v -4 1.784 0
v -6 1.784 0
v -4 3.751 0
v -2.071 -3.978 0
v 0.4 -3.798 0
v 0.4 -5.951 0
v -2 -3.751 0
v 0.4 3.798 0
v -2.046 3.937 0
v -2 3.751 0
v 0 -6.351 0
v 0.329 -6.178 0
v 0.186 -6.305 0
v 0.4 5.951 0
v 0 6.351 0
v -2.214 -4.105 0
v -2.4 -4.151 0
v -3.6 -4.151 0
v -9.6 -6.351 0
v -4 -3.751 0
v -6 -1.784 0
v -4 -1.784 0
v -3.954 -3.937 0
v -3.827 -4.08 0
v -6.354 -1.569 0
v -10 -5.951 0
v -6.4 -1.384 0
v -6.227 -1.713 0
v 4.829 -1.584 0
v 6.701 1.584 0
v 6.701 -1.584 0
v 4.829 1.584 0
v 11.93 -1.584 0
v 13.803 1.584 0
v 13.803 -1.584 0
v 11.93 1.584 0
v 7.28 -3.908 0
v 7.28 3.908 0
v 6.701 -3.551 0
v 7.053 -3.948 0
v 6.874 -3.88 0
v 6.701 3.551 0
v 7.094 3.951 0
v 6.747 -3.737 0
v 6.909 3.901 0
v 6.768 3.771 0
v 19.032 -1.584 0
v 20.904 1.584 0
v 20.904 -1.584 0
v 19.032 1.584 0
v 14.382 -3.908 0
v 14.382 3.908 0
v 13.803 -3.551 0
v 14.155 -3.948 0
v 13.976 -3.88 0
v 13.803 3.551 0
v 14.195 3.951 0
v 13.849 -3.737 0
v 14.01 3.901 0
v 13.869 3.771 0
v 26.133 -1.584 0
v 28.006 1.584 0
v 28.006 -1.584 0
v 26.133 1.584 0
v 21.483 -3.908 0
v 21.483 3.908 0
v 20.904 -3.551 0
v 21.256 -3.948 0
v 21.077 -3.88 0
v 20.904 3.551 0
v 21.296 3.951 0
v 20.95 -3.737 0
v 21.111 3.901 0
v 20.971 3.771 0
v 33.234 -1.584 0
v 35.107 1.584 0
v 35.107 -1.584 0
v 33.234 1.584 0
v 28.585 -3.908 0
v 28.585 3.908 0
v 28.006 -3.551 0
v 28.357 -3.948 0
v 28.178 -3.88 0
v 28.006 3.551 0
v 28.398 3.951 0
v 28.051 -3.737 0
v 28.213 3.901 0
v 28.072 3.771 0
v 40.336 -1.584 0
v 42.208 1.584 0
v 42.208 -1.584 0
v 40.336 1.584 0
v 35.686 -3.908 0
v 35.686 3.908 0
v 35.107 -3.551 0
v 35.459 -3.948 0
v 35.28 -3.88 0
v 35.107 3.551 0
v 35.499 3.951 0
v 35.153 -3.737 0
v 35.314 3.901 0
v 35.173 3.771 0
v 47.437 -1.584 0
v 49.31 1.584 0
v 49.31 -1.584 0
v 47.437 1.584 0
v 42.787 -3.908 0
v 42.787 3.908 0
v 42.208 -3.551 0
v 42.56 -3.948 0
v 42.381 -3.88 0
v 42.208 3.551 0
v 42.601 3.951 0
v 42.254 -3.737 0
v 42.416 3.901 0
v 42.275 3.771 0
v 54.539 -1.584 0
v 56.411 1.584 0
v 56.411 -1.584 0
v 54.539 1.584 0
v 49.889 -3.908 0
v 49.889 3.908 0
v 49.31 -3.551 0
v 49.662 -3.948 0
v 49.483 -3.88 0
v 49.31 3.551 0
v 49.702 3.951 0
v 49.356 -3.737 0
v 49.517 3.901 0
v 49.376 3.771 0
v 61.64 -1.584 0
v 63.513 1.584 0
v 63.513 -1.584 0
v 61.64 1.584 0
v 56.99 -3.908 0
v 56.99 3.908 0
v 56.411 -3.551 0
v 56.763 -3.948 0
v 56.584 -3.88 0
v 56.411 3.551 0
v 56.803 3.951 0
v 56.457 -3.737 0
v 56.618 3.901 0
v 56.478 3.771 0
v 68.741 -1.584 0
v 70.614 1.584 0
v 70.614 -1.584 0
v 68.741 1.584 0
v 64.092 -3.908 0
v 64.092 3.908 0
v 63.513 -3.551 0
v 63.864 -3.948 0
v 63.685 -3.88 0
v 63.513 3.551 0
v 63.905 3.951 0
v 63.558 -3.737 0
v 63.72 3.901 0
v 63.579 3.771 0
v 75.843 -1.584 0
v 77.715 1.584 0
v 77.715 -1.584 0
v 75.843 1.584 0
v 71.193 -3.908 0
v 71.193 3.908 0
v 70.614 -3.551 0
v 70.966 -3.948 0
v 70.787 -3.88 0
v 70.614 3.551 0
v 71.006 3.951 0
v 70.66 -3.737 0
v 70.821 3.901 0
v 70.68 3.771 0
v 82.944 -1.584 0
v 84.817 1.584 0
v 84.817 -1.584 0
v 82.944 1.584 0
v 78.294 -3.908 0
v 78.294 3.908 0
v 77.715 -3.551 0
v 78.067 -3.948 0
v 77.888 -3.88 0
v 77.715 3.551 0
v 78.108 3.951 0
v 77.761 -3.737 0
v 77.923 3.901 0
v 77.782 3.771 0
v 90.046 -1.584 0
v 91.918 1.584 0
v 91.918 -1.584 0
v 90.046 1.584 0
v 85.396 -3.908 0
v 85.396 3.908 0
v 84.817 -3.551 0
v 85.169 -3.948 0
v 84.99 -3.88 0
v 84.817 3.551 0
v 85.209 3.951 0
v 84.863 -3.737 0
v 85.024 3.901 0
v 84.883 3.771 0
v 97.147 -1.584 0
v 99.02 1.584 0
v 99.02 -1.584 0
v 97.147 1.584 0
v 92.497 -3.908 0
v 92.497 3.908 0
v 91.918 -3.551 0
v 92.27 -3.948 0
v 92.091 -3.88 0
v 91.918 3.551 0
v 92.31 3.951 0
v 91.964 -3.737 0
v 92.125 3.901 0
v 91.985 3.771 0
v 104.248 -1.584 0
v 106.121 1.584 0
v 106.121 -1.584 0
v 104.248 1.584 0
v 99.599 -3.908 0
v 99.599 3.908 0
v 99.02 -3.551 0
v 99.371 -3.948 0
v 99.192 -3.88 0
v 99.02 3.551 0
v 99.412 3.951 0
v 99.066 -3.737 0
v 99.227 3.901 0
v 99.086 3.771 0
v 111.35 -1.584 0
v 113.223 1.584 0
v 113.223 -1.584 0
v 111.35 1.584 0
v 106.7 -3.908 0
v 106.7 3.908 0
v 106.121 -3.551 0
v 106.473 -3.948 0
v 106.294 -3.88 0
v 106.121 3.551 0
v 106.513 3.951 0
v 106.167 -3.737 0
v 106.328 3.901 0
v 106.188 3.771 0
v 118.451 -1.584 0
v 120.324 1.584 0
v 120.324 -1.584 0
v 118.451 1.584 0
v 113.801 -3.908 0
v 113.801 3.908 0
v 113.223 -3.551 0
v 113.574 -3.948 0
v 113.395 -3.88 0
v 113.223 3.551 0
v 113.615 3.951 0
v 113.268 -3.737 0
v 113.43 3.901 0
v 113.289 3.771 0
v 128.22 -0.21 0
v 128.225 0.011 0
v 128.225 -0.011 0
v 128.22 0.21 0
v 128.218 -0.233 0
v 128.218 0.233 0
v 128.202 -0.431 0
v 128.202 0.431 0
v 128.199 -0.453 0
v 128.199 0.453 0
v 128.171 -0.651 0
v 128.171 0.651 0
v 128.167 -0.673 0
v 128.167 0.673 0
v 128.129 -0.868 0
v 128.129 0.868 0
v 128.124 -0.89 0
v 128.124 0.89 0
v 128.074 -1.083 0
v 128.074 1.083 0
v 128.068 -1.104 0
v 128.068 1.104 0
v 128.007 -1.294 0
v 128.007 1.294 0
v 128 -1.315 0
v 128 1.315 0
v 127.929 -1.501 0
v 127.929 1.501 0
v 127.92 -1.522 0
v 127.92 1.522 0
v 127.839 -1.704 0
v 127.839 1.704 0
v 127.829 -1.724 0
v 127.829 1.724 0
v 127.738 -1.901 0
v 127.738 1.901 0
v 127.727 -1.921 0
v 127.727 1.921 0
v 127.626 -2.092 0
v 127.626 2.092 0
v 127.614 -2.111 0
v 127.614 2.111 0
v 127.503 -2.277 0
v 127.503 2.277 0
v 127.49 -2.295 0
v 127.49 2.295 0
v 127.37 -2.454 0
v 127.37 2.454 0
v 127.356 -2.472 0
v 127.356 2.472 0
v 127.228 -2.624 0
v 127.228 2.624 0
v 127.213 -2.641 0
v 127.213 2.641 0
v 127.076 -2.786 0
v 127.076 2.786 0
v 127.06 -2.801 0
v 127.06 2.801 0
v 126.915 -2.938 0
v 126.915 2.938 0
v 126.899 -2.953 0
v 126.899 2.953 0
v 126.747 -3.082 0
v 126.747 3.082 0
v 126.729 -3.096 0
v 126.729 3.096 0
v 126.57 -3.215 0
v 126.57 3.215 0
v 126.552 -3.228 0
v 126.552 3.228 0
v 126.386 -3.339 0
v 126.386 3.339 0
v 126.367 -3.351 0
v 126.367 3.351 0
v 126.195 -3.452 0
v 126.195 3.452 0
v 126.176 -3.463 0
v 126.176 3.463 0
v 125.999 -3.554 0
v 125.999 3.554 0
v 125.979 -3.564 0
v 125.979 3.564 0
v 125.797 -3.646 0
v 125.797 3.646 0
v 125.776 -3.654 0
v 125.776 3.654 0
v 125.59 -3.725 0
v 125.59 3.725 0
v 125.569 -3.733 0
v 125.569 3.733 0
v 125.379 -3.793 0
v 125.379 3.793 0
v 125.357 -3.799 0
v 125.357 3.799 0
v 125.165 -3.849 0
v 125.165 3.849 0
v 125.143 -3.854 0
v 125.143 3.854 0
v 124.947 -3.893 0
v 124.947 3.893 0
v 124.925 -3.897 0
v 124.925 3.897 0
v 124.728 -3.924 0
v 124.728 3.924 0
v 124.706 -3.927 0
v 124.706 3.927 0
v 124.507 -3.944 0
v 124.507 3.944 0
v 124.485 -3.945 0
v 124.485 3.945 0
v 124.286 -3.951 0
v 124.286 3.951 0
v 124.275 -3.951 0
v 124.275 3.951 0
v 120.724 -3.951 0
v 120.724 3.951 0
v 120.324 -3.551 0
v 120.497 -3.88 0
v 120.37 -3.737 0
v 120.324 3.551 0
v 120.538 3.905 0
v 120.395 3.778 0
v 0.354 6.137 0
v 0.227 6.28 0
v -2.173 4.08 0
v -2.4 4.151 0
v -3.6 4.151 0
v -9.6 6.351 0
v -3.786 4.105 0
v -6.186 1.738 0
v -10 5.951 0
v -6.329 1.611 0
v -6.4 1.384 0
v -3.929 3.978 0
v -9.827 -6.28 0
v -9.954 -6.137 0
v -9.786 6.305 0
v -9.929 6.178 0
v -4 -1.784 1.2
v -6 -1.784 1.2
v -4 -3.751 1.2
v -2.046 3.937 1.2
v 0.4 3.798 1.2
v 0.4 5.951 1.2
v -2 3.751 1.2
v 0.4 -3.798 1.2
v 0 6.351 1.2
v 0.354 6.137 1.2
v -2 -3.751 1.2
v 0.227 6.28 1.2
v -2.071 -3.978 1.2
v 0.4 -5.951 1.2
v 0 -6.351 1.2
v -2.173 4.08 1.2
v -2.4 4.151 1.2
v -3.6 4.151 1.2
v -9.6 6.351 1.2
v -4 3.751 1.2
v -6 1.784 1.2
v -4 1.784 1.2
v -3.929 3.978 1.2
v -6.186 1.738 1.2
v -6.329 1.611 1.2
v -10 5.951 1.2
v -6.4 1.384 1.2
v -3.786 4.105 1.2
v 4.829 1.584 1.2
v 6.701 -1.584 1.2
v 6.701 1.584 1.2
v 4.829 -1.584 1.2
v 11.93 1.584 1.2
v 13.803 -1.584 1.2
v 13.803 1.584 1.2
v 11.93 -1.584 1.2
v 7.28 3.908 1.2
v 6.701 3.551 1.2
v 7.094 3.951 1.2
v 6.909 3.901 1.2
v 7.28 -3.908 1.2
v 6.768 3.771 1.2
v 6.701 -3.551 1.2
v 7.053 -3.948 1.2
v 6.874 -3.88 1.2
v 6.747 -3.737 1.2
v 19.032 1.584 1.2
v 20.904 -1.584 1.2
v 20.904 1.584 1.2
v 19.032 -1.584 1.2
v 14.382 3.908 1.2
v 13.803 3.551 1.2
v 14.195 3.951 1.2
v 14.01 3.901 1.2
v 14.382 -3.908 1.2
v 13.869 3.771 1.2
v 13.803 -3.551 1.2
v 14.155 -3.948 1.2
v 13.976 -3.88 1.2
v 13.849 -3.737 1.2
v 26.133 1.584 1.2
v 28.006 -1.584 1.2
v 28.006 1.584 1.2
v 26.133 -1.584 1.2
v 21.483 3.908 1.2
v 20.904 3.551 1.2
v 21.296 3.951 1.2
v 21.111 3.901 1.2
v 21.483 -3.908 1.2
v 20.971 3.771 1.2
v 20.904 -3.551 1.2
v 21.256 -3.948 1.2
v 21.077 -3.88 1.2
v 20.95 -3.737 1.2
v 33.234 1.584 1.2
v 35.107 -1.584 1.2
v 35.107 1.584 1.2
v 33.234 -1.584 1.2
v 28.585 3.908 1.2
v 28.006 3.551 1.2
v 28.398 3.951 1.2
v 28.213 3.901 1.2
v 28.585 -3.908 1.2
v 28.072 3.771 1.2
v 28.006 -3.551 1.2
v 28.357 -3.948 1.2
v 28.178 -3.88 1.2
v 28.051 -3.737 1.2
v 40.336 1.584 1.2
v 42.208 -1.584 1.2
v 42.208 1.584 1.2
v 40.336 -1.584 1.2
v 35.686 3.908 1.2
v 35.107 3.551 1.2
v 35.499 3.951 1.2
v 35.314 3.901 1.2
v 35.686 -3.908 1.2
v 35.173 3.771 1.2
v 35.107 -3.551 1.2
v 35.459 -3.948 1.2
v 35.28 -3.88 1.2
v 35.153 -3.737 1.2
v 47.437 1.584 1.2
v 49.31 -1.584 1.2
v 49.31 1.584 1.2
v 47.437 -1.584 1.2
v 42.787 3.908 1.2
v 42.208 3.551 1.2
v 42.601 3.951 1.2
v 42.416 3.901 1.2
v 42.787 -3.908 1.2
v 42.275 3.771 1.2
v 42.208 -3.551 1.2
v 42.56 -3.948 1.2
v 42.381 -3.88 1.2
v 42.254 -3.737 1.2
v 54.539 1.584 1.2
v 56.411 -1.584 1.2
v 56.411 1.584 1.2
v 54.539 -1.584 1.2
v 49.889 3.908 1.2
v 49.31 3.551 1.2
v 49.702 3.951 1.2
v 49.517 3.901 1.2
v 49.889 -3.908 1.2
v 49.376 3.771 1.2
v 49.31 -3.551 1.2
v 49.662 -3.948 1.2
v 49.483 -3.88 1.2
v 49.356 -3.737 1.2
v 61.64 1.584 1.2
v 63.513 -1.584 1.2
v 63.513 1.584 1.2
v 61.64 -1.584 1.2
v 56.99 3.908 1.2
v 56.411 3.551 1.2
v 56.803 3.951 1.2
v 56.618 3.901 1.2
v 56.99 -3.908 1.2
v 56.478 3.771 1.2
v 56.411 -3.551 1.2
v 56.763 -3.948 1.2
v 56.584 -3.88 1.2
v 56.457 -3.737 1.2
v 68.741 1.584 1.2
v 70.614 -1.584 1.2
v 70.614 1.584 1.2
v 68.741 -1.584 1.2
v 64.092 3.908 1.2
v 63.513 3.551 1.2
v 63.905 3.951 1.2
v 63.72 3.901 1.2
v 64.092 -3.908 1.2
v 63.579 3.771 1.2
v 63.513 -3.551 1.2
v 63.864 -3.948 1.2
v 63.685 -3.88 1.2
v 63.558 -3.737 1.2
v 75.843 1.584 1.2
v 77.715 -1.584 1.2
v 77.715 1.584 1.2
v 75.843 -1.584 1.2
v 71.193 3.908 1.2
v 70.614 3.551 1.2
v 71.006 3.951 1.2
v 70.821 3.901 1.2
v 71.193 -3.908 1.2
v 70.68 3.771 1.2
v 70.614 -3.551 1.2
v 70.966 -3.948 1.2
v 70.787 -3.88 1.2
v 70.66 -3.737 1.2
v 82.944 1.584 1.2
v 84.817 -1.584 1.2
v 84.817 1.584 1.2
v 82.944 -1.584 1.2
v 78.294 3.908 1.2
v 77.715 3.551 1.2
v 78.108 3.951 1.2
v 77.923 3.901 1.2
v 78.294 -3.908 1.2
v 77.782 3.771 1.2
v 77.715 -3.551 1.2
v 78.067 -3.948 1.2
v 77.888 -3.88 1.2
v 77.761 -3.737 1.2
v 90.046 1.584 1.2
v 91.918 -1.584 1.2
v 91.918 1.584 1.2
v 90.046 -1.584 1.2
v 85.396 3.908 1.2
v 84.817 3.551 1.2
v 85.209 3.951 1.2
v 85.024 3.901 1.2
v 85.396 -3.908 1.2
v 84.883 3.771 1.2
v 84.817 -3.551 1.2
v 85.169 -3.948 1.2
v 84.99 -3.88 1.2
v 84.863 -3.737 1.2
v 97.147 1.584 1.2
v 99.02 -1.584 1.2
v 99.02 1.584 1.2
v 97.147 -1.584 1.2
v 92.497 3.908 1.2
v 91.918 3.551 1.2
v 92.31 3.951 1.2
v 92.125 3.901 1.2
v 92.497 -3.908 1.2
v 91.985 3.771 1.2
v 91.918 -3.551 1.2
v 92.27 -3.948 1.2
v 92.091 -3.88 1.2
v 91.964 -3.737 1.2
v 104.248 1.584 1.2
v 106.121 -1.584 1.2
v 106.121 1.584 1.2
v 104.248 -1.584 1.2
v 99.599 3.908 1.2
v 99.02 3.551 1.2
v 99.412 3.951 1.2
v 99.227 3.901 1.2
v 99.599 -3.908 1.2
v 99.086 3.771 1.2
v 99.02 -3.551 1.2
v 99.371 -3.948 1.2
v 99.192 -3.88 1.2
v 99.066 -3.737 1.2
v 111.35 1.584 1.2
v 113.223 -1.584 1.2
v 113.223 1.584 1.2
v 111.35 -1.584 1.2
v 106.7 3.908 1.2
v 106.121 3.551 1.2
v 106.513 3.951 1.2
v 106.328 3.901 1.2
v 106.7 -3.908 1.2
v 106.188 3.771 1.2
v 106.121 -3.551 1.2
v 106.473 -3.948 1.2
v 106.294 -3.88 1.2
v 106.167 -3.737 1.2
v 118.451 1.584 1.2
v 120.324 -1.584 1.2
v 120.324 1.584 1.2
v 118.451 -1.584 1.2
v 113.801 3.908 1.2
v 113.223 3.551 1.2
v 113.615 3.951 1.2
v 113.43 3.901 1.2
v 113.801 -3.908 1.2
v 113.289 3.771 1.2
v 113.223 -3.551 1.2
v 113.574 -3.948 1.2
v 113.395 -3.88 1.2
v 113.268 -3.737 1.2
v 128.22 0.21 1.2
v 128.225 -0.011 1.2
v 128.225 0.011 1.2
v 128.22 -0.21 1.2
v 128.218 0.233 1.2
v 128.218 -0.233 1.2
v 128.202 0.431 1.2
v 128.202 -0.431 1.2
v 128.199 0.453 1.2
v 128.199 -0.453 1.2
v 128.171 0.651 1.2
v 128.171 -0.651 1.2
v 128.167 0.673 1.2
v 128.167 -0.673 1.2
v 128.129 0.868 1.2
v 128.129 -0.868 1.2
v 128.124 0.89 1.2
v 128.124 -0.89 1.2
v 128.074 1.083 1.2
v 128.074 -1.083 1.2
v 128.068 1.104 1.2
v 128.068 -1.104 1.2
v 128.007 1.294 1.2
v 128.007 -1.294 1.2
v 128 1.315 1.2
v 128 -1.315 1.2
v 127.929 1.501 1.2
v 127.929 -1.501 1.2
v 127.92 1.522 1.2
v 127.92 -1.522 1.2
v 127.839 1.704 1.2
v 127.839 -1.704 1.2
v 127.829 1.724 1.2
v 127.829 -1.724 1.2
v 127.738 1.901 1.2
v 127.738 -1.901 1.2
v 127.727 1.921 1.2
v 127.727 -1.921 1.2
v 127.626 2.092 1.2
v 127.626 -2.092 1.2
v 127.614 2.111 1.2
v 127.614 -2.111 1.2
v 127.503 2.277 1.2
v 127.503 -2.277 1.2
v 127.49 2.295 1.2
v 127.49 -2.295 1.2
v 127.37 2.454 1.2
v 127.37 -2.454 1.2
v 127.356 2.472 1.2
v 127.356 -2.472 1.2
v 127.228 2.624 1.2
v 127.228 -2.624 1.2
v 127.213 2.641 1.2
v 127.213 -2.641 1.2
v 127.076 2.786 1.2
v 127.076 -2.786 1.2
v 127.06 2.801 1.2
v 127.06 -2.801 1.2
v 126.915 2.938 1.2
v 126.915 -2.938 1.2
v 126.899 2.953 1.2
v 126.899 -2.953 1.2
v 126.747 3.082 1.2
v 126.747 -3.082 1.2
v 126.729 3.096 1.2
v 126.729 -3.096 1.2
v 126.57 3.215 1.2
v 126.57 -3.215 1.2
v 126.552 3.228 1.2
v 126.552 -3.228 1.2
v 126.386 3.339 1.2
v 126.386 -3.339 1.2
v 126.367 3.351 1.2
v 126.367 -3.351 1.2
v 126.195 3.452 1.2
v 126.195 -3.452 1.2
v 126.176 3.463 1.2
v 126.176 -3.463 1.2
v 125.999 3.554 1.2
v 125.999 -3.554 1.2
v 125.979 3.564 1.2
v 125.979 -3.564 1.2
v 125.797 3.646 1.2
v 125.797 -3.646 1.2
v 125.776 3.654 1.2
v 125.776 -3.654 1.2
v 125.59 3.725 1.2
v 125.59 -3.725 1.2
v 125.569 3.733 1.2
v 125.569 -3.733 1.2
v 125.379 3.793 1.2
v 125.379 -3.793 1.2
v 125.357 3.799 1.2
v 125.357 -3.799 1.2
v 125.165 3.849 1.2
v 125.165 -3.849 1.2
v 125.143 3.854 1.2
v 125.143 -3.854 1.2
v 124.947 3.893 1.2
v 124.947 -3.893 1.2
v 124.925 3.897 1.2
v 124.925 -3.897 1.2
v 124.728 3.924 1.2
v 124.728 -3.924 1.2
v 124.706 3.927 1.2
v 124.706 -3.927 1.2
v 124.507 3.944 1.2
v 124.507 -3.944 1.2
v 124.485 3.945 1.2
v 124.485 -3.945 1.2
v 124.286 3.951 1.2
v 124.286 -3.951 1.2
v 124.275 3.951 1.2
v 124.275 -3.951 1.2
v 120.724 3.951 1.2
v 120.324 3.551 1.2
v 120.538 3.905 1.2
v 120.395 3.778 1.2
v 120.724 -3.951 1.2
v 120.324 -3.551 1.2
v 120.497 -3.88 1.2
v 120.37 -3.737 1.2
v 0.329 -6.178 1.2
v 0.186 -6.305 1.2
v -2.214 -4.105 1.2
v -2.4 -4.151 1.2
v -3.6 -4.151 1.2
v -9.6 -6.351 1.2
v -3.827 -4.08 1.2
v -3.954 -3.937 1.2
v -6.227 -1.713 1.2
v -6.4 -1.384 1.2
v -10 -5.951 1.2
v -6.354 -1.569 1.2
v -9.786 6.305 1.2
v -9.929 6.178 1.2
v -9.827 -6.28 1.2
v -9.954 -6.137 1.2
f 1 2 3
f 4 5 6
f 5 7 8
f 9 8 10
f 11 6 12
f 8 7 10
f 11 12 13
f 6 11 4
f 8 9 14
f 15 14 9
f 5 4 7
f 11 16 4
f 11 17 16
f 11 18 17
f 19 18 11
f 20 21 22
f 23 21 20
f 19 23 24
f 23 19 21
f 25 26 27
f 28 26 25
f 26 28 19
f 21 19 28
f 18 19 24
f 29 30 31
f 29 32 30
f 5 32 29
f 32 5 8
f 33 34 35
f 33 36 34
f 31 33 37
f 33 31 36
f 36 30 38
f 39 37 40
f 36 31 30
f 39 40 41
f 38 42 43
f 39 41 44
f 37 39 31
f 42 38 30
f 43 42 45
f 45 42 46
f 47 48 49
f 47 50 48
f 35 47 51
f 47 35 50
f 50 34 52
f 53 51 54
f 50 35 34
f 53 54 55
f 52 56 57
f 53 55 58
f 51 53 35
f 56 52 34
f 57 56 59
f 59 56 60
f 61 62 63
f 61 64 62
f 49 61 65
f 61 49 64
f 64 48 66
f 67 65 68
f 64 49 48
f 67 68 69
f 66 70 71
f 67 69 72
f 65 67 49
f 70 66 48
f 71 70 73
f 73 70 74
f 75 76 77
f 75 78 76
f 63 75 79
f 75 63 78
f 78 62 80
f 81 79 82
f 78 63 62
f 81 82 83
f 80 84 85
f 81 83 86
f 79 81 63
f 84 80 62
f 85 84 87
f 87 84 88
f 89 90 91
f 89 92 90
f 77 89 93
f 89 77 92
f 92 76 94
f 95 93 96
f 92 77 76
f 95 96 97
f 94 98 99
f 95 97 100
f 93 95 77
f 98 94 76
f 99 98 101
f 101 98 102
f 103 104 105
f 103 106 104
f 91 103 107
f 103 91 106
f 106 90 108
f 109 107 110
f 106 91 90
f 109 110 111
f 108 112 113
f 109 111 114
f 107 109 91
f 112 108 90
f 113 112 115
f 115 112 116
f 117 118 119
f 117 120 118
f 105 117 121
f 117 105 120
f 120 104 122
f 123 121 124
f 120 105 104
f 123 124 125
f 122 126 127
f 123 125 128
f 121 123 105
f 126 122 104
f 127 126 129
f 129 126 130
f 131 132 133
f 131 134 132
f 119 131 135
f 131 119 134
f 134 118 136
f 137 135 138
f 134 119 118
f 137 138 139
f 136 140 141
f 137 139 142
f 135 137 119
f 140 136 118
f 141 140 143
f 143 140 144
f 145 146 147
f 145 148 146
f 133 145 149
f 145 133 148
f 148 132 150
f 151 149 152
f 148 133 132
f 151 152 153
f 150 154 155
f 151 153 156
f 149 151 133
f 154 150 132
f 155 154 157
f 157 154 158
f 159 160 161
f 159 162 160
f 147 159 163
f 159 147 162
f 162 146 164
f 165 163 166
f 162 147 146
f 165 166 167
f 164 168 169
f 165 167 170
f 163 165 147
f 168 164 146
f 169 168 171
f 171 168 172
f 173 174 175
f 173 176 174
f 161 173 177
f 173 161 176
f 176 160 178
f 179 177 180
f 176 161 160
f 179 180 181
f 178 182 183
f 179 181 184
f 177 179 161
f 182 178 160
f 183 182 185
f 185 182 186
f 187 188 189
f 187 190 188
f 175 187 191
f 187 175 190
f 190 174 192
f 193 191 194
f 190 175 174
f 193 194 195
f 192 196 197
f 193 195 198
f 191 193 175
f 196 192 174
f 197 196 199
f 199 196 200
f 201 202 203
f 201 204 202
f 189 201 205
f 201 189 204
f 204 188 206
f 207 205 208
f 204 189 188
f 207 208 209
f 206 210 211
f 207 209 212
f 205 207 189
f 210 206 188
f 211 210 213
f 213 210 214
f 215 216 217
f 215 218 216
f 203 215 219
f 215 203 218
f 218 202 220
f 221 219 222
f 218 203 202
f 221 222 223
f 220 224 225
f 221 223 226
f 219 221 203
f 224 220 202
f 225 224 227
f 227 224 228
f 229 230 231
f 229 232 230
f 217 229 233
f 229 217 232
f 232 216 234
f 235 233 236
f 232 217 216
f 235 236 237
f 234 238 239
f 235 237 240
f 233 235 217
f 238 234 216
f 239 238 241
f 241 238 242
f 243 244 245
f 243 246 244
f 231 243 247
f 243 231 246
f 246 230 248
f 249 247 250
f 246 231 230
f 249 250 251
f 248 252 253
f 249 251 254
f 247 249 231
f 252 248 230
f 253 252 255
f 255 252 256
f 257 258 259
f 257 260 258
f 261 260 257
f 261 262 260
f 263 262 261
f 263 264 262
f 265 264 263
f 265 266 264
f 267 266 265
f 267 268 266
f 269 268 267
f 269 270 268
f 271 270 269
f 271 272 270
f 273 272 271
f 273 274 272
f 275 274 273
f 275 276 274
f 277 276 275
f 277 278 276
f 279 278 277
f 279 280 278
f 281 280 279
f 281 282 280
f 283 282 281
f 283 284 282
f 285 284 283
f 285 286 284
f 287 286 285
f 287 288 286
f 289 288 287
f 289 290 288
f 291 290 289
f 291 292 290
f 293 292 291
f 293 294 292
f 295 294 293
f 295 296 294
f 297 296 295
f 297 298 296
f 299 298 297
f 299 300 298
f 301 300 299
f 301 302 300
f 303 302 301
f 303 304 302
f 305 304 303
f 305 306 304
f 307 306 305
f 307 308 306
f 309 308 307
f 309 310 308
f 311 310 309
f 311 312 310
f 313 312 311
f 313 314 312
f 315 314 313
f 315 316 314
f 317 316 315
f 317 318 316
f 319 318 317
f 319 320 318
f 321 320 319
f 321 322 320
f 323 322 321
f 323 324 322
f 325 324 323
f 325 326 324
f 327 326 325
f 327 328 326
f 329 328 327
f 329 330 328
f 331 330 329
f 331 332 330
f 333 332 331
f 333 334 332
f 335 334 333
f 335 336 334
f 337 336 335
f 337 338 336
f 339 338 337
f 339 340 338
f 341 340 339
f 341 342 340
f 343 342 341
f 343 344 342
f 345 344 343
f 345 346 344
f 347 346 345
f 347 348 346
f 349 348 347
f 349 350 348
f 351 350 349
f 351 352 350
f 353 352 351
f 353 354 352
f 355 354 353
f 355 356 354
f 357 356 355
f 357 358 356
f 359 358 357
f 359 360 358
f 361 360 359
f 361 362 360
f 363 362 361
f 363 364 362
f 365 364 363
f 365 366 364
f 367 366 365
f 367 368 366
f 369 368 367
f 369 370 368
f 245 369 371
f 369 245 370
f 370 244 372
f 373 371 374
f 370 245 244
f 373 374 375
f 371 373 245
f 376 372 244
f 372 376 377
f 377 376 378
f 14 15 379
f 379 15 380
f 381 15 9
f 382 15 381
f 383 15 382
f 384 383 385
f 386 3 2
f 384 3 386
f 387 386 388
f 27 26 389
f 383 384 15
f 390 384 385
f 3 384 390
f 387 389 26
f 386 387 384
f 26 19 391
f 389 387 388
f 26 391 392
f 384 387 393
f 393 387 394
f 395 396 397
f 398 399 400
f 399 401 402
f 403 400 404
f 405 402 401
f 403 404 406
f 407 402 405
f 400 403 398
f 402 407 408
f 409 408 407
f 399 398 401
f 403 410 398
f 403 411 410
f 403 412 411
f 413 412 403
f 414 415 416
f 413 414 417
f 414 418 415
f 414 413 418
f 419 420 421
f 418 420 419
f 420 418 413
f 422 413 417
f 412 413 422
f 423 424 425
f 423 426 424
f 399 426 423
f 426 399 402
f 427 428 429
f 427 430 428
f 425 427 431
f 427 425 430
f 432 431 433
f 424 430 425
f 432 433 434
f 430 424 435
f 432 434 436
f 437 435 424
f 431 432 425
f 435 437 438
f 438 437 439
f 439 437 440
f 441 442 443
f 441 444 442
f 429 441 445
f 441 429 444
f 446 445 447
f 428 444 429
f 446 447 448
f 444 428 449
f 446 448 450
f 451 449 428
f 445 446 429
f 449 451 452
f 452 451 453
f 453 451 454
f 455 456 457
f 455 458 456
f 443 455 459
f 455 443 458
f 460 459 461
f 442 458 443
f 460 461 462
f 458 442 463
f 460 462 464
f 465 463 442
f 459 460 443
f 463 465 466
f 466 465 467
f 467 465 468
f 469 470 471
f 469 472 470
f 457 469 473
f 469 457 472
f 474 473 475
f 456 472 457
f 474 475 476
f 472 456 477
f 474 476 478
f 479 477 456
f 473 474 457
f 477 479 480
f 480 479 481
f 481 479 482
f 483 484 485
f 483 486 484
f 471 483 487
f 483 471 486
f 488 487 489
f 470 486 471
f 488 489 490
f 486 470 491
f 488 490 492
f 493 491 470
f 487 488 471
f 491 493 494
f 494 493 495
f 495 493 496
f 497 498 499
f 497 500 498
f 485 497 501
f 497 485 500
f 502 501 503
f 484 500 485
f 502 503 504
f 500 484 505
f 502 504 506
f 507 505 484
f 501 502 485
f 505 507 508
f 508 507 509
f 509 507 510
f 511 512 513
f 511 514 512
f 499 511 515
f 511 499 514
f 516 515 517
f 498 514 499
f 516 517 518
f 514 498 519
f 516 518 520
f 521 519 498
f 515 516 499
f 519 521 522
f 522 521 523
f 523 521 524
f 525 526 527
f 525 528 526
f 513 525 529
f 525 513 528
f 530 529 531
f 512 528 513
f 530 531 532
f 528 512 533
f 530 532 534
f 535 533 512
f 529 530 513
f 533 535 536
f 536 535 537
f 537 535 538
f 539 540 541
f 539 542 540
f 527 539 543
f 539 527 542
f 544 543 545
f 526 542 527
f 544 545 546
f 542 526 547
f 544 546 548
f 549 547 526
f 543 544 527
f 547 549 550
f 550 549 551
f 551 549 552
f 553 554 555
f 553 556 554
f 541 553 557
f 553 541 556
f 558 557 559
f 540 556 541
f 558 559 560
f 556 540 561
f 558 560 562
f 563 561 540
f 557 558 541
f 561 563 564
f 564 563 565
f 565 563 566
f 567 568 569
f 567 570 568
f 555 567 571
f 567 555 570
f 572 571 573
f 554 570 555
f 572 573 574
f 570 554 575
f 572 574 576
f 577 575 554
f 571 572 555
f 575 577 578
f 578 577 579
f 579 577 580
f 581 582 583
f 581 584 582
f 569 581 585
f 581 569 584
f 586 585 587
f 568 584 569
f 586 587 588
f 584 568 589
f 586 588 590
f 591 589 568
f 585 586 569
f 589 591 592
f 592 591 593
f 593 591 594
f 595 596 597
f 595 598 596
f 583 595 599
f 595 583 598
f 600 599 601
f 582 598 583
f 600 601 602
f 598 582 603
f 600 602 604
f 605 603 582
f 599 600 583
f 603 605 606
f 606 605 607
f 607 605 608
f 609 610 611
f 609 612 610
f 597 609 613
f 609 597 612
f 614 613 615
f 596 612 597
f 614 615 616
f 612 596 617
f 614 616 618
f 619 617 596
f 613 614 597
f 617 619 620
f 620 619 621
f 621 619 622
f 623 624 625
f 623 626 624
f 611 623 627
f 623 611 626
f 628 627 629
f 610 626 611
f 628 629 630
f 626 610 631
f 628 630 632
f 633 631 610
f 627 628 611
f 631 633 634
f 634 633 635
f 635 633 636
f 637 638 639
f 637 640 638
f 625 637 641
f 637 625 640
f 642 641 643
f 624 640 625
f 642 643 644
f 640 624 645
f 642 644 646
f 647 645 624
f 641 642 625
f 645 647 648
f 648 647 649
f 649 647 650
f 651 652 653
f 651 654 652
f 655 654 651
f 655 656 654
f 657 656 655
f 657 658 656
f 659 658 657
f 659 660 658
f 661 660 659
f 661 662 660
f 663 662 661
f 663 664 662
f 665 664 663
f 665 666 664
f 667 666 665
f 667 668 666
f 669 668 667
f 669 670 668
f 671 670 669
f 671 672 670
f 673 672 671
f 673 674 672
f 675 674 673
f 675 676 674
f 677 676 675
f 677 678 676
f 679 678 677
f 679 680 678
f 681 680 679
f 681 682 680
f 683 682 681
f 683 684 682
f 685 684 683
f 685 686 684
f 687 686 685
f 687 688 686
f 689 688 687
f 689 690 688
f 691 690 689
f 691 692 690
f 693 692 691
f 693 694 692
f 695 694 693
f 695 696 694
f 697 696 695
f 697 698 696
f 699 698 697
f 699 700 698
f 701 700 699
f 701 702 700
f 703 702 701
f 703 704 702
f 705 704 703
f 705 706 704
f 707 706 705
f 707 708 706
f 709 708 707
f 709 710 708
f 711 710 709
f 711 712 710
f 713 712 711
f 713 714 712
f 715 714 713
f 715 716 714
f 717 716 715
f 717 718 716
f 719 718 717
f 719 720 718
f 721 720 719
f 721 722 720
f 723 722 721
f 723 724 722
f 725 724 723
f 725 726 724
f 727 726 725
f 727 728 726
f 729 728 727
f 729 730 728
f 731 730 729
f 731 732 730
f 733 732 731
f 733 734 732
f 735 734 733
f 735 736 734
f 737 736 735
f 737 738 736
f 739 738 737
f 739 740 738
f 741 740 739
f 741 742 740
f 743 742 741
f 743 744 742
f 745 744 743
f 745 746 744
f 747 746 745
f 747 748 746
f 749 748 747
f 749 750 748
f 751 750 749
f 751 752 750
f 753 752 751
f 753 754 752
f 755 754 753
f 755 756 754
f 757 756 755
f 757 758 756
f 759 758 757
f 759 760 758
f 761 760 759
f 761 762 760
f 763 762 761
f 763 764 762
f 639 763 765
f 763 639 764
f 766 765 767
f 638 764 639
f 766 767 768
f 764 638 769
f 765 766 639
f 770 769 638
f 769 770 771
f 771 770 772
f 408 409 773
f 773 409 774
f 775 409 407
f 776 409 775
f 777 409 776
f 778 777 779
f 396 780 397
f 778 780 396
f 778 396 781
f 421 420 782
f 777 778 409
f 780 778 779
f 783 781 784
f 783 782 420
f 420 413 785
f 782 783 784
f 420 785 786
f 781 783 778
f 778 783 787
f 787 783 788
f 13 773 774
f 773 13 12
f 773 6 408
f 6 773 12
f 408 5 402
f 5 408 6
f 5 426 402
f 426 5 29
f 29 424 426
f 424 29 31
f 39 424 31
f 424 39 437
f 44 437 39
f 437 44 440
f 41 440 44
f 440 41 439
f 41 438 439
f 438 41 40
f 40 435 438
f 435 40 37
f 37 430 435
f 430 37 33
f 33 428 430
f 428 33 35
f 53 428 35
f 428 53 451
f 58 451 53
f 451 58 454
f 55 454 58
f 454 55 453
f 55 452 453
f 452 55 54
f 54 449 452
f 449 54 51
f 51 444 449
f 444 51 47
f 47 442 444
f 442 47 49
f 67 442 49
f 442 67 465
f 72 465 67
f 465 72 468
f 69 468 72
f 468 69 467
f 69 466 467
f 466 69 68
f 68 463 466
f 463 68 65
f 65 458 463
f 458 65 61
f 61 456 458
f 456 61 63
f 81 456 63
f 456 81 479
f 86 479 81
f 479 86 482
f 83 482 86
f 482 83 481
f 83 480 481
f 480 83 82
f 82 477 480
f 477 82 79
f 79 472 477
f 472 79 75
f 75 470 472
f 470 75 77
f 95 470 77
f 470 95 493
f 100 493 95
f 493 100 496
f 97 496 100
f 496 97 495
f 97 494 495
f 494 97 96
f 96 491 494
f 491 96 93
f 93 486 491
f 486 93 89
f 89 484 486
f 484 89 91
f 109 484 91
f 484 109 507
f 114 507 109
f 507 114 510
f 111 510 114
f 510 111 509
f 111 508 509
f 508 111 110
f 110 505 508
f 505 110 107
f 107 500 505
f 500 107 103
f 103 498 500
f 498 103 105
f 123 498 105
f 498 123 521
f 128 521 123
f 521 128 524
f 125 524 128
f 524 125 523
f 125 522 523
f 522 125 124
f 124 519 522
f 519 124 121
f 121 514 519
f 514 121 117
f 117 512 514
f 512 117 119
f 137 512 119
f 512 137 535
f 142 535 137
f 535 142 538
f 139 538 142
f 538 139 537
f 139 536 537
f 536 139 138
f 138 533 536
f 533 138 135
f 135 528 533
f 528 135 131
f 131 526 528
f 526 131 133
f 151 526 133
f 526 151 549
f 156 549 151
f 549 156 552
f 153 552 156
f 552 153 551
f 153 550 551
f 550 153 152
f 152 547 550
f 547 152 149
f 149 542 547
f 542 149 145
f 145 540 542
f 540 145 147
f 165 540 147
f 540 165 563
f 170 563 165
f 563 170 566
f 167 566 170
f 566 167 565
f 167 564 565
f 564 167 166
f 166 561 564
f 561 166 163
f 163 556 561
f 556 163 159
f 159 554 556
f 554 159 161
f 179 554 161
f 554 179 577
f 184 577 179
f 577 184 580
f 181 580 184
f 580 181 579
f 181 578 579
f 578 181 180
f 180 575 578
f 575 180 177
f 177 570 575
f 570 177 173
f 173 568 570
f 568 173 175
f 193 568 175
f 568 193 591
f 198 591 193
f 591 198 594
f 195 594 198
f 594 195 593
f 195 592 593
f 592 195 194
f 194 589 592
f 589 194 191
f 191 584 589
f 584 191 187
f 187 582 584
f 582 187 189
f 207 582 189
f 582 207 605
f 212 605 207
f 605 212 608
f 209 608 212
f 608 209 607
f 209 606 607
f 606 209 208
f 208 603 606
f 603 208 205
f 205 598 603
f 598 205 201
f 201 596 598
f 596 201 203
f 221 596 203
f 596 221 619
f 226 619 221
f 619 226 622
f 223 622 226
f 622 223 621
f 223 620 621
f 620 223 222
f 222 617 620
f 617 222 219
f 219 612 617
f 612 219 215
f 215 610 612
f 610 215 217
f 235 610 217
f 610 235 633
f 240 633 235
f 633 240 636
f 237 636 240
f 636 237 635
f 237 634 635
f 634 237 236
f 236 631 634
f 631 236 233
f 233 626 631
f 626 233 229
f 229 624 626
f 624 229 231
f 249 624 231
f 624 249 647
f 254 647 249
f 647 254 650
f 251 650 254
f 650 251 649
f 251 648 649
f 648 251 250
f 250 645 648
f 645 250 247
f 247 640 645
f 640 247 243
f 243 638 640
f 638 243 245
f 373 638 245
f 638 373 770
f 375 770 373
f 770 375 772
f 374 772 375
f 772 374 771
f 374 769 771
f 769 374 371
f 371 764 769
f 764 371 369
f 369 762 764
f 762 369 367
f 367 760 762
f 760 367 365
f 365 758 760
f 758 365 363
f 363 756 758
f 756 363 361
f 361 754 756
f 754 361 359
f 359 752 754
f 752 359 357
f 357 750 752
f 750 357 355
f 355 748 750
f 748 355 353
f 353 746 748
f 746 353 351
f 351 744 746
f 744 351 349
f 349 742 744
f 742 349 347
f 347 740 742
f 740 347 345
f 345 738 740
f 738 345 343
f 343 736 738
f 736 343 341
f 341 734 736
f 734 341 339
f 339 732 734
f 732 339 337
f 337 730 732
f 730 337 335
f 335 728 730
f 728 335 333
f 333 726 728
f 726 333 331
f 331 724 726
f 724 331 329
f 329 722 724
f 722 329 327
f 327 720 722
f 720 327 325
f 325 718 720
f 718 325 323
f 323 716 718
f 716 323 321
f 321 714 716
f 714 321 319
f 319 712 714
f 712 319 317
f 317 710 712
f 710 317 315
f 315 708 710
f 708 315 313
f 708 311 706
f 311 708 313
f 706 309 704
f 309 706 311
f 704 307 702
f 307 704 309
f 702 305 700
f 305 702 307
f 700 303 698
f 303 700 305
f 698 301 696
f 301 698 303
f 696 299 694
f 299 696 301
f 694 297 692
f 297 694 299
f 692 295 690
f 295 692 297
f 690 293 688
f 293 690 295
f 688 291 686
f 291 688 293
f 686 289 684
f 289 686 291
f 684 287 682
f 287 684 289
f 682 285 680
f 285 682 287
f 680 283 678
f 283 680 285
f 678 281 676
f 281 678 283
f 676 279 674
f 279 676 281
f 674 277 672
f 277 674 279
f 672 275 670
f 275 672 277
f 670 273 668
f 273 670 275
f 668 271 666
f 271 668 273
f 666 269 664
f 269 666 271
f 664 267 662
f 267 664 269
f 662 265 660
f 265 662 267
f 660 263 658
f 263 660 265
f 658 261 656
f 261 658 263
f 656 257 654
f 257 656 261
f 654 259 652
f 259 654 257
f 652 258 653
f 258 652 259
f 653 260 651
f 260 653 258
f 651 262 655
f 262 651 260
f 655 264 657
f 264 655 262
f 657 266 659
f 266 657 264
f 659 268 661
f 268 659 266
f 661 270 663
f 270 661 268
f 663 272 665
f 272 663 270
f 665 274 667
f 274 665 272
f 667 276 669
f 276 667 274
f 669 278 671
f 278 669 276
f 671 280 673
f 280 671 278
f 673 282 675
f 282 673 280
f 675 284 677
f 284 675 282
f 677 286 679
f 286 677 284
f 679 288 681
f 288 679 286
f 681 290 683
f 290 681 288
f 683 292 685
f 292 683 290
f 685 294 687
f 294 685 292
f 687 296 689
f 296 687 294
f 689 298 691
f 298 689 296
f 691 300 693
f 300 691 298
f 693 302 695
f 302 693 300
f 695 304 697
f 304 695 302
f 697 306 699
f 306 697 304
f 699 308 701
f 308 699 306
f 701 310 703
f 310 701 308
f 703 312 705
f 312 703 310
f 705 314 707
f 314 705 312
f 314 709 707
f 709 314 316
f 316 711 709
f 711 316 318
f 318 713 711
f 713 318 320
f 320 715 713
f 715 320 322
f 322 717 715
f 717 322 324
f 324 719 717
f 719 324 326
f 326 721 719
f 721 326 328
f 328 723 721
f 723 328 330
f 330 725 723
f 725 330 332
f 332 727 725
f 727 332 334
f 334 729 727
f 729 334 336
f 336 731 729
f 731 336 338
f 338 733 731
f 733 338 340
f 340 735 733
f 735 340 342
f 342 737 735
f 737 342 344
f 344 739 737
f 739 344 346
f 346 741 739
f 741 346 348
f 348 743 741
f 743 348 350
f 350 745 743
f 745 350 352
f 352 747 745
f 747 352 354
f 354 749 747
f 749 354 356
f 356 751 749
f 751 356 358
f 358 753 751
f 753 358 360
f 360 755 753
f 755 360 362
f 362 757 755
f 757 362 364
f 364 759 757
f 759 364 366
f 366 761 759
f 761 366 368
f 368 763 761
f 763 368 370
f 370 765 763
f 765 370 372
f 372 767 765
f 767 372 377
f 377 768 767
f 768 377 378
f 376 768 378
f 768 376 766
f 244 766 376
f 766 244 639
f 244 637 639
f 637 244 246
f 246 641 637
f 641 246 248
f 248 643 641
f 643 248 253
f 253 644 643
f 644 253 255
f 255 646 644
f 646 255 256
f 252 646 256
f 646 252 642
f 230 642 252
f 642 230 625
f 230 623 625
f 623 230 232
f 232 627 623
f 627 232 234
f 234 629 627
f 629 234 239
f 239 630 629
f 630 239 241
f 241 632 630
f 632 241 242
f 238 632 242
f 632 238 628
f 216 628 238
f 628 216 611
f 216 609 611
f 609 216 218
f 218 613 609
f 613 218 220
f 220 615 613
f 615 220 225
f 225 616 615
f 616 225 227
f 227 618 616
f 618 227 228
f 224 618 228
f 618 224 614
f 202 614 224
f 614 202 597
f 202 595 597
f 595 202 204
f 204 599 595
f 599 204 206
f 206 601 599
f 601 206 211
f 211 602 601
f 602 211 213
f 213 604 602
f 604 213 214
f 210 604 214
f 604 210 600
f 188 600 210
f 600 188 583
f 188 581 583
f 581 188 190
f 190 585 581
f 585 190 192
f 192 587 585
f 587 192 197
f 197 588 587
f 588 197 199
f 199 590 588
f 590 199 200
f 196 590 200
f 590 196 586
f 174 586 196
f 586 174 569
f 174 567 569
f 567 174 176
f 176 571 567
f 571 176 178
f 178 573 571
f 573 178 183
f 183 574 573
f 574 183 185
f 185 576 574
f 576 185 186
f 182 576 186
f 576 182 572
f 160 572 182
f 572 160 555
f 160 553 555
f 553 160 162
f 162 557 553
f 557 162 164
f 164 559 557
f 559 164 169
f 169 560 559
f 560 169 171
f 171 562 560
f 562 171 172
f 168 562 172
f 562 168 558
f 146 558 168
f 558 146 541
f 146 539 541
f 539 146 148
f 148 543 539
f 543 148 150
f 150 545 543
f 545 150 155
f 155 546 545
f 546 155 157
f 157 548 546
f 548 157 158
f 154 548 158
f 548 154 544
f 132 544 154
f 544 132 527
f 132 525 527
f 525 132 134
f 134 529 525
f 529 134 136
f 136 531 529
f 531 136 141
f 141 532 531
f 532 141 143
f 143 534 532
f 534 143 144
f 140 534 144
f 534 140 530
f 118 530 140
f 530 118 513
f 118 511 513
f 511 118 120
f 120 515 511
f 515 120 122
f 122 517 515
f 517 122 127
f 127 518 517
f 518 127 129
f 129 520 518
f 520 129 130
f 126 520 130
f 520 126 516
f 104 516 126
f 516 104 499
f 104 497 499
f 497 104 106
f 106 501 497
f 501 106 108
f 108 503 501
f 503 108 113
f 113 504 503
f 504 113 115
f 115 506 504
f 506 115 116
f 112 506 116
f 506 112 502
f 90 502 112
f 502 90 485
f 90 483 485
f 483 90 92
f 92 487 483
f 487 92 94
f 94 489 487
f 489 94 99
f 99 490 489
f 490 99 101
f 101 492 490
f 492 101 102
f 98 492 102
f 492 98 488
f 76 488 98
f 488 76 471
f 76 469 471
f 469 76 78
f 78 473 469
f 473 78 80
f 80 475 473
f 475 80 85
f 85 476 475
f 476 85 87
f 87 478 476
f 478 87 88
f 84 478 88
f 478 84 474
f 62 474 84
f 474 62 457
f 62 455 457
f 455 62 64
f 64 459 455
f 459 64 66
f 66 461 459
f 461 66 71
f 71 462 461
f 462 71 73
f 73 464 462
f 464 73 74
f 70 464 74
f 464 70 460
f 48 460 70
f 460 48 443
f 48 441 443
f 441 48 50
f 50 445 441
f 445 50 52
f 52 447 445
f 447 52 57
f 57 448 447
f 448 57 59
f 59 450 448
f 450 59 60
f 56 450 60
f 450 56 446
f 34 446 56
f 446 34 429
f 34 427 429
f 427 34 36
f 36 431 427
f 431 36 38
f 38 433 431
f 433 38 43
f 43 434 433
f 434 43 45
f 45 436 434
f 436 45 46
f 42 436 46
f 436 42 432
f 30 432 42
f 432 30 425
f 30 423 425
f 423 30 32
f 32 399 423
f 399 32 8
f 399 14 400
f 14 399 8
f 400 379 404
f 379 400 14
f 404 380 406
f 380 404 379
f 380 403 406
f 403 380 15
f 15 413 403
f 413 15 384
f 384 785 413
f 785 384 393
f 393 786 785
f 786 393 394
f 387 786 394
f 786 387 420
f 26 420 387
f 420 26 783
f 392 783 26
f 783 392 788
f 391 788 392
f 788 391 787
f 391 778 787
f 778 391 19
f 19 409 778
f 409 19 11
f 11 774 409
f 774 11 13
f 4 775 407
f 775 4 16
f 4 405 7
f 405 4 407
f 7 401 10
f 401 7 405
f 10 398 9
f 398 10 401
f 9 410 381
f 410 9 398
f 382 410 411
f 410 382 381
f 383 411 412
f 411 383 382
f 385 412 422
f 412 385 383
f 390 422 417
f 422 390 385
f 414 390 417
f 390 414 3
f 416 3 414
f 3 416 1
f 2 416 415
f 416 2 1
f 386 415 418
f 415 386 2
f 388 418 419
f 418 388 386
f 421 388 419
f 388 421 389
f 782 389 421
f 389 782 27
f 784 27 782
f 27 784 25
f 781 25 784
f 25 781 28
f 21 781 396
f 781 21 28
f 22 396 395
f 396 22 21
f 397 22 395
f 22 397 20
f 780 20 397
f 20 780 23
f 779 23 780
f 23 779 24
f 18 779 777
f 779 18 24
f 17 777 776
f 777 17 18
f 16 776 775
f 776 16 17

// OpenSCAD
/*
 * cabletie.scad generates cable ties primarly meant to be 3D printed in TPU
 */

// Variables default values
cabletie_width = 9;
cabletie_wrapping_diameter = 40;
cabletie_minimum_thickness = 1.2; // would be overrided if to large
label="";
label_font="Liberation Sans:style=Bold";

// FDM 3D printer parameters
nozzle_width = 0.4;
printer_tolerance = 0.2;

// Resolution
$fa=2; // default minimum facet angle
$fs=0.2; // default minimum facet size

module cabletie(w=cabletie_width,
                d=cabletie_wrapping_diameter,
                t=cabletie_minimum_thickness,
                l=label,
                nw=nozzle_width,
                pt=printer_tolerance) {

     // Funcions
     function cabletie_wrapping_circumference(d)
          = 3.14*d;
     function cabletie_steps_lenth(w, nw)
          = (w-2*nw)*cos(30);
     function cabletie_links_count(d, w, nw)
          = floor(cabletie_wrapping_circumference(d)/cabletie_steps_lenth(w, nw));
     function retainer_hole_length(w, nw)
          = cabletie_steps_lenth(w, nw)/3;
     function release_hole_length(w, nw)
          = cabletie_steps_lenth(w, nw);
     function cabletie_maximum_thickness(w, nw)
          = (cabletie_steps_lenth(w, nw)/3+nw)/tan(30)-(nw/sin(30)-nw);
     function cabletie_thickness(mini_thickness, maxi_thickness)
          = mini_thickness > maxi_thickness ? maxi_thickness : mini_thickness;
     function cabletie_lock_length()
          = cabletie_thickness(t, cabletie_maximum_thickness(w, nw))*8;
     function cabletie_lock_width()
          = cabletie_thickness(t, cabletie_maximum_thickness(w, nw))*4+release_hole_length(w, nw);

     // Generates the links
     module cabletie_links() {
          for (i = [0 : cabletie_steps_lenth(w, nw) : cabletie_steps_lenth(w, nw)*(cabletie_links_count(d, w, nw)-1)]) {
               translate([i, 0, 0]) {
                    // Shape of a regular links
                    polygon(points=[[0,0],
                                    [0,cabletie_steps_lenth(w, nw)/2],
                                    [cabletie_steps_lenth(w, nw),0],
                                    [0,-cabletie_steps_lenth(w, nw)/2]]);
               }
          }
          // Last link custom shape
          translate([cabletie_steps_lenth(w, nw)*(cabletie_links_count(d, w, nw)+1/2), 0, 0]) {
               circle(d = cabletie_steps_lenth(w, nw));
          }
          translate([cabletie_steps_lenth(w, nw)*(cabletie_links_count(d, w, nw)), -cabletie_steps_lenth(w, nw)/2, 0]) {
               square([cabletie_steps_lenth(w, nw)/2, cabletie_steps_lenth(w, nw)]);
          }
          // Connect all links
          translate([0, -(cabletie_steps_lenth(w, nw)/3)/2, 0]) {
               square([cabletie_steps_lenth(w, nw)*(cabletie_links_count(d, w, nw)), cabletie_steps_lenth(w, nw)/3]);
          }
     }

     // Generates the cabletie lock frame
     module cabletie_lock_boundary() {
          translate([-cabletie_lock_length(),
                     -cabletie_lock_width()/2,
                     0]) {
               square([cabletie_lock_length(),
                       cabletie_lock_width()]);
          }
     }

     // Generates the cabletie lock hole
     module cabletie_lock_hole() {
          union() {
               translate([-3/8*cabletie_lock_length(),
                          -release_hole_length(w, nw)/2-printer_tolerance,
                          0])
                    square([cabletie_thickness(t, cabletie_maximum_thickness(w, nw)),
                            release_hole_length(w, nw)+2*printer_tolerance]);
               // retainer hole
               translate([-5/8*cabletie_lock_length(),
                          -retainer_hole_length(w, nw)/2-printer_tolerance,
                          0])
                    square([2/8*cabletie_lock_length(),
                            retainer_hole_length(w, nw)+2*printer_tolerance]);
          }
     }

     // Generates text
     module cabletie_text(l) {
          translate([-cabletie_lock_length(), 0, 0]) {
               resize([0, 0.7*cabletie_lock_width()], auto=true) {
                    text(l, valign = "center", halign = "right", font = label_font);
               }
          }
     }

     // Generates label boundary
     module cabletie_label_boundary(l) {
          minkowski() {
               resize([0, 0.7*cabletie_lock_width()])
                    hull() projection() translate([0, 1/2, 0]) rotate([90, 0, 0]) linear_extrude(1) cabletie_text(l);
               circle(d=0.3*cabletie_lock_width());
          }
     }
     // Main
     difference() {
          // Positive shapes
          linear_extrude(cabletie_thickness(t, cabletie_maximum_thickness(w, nw))) {
               offset(r = nozzle_width) {
                    union() {
                         cabletie_links();
                         hull() {
                              cabletie_lock_boundary();
                              cabletie_label_boundary(l);
                         }
                    }
               }
          }
          // Negative shapes
          union() {
               translate([0, 0, cabletie_thickness(t, cabletie_maximum_thickness(w, nw))/2]) {
                    linear_extrude(cabletie_thickness(t, cabletie_maximum_thickness(w, nw))/2) {
                         cabletie_text(l);
                    }
               }
               linear_extrude(cabletie_thickness(t, cabletie_maximum_thickness(w, nw))) {
                    offset(r = nozzle_width) {
                         cabletie_lock_hole();
                    }
               }
          }
     }
}

// Demo
//cabletie(6, 15, 1.0);
//translate([0, -12, 0]) cabletie(6, 20, 1.0);
//translate([0, -24, 0]) cabletie(6, 25, 1.0);
//
//translate([0, -40, 0]) cabletie(8, 20, 1.2);
//translate([0, -55, 0]) cabletie(8, 25, 1.2);
//translate([0, -70, 0]) cabletie(8, 30, 1.2);
//
//translate([0, -90, 0]) cabletie(10, 35, 1.4);
//translate([0, -108, 0]) cabletie(10, 45, 1.4);
//translate([0, -126, 0]) cabletie(10, 55, 1.4);
//
//translate([0, -150, 0]) cabletie(w=10, d=60, t=1.6, l="Label");
//translate([0, -170, 0]) cabletie(w=10, d=65, t=1.6, l="Cabletie");
//translate([0, -190, 0]) cabletie(w=10, d=70, t=1.6, l="OpenSCAD");

// Customizer
cabletie();
